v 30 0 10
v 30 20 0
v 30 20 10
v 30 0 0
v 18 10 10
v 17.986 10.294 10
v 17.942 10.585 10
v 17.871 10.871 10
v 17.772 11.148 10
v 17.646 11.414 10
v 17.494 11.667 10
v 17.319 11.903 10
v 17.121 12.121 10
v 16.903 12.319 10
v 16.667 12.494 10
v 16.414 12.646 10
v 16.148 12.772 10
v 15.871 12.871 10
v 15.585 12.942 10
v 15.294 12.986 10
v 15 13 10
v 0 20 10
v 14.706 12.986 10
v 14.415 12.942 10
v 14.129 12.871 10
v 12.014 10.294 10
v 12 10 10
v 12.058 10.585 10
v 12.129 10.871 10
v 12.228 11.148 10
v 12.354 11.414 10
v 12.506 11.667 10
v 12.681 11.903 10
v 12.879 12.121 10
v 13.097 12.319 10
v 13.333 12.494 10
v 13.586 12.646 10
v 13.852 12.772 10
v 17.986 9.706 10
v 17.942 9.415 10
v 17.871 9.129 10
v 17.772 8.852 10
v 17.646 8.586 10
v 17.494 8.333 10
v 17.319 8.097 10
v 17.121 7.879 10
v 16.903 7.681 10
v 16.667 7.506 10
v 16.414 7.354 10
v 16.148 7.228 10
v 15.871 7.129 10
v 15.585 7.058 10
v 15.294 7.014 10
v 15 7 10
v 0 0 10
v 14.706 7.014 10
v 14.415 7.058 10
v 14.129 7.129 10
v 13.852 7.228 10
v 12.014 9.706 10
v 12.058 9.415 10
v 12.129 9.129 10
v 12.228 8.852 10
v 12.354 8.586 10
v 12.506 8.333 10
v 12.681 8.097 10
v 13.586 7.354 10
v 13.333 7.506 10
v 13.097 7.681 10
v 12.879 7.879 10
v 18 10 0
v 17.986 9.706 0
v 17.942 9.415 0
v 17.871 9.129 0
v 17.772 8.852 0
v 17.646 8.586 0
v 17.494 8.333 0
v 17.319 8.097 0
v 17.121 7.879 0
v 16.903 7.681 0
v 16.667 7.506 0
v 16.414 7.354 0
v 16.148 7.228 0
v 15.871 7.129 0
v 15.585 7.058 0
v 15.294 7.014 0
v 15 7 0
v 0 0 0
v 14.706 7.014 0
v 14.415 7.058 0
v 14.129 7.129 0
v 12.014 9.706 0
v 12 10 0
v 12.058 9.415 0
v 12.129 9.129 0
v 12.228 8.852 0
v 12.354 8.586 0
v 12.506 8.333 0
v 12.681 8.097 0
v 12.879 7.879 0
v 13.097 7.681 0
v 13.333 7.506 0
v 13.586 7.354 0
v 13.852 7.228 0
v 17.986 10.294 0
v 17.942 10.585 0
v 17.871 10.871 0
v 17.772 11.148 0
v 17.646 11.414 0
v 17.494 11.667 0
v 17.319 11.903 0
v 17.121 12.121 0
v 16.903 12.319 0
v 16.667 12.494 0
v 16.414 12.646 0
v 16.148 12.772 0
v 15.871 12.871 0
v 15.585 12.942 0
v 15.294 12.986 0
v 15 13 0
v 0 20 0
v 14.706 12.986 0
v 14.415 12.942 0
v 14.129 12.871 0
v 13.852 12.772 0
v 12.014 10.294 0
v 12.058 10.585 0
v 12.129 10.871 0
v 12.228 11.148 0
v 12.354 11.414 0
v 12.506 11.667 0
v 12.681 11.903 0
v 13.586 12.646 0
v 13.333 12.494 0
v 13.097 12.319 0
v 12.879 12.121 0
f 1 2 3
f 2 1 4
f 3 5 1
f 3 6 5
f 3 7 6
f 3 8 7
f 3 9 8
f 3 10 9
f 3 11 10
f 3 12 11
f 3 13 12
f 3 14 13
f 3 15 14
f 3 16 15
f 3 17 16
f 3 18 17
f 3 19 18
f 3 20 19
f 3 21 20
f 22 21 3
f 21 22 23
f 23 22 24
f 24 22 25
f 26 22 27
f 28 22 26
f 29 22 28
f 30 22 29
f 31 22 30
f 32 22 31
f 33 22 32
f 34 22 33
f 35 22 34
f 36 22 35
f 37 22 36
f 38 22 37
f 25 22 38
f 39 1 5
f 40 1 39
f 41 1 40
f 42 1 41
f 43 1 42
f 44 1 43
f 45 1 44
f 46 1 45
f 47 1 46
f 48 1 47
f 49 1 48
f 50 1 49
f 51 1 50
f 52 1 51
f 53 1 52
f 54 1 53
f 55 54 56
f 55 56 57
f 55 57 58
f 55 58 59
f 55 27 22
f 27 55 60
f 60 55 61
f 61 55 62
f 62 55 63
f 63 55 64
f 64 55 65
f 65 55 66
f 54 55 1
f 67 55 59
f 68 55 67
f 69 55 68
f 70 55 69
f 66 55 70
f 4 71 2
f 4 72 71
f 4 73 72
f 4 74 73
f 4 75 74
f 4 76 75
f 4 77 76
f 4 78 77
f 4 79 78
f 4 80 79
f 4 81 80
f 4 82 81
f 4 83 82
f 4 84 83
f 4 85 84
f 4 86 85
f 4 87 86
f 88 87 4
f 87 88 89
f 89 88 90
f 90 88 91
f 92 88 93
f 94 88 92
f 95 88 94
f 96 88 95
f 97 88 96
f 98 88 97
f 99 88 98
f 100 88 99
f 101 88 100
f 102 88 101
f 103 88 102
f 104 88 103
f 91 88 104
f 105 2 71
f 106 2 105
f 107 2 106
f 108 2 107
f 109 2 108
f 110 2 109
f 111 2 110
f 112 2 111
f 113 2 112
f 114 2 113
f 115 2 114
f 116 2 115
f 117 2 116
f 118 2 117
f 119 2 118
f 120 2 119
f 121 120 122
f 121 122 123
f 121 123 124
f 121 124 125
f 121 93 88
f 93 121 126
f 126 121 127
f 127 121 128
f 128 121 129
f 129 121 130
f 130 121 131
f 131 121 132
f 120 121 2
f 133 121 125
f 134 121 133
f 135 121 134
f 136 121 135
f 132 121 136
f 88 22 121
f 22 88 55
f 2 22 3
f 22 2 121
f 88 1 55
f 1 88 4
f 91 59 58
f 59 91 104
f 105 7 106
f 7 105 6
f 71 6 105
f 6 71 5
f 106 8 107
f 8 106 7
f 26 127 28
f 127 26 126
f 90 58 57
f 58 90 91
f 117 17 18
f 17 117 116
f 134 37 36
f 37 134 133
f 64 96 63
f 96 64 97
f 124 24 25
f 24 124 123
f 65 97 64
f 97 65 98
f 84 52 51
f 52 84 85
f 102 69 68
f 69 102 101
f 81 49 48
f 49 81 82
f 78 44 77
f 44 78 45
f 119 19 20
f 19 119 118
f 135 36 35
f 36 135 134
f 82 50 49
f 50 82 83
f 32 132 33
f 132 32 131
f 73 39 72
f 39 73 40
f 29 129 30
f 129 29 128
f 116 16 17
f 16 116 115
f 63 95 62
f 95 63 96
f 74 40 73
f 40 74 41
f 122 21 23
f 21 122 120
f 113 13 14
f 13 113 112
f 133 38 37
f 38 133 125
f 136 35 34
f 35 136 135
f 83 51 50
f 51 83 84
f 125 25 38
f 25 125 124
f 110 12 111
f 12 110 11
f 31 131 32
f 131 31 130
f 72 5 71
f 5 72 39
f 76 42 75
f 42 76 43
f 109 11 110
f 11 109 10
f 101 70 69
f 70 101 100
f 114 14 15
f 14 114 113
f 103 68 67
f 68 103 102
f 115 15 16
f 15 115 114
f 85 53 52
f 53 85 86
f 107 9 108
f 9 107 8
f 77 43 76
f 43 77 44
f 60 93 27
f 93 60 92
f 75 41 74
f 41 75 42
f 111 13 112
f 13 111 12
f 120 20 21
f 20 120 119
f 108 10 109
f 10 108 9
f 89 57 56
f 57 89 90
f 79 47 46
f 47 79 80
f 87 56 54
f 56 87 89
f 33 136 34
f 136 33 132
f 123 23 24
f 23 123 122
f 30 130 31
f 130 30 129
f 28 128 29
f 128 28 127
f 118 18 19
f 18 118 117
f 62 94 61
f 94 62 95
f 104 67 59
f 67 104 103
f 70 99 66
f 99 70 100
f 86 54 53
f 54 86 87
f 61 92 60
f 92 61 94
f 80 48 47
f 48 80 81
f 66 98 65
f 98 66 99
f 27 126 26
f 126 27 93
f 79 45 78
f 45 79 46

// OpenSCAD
// Known-answer fixture for OpenSCAD 2021.01 + FreeCAD 1.1.3 (tools/toolchain.lock.md section 1.1).
// A 30 x 20 x 10 mm block with one 6 mm through hole on the vertical axis at (15, 10).
// Restricted dialect of ADR-008: cube, cylinder, difference, translate; $fn >= 32 on the round feature.
difference() {
    cube([30, 20, 10]);
    translate([15, 10, -1]) cylinder(d = 6, h = 12, $fn = 64);
}
